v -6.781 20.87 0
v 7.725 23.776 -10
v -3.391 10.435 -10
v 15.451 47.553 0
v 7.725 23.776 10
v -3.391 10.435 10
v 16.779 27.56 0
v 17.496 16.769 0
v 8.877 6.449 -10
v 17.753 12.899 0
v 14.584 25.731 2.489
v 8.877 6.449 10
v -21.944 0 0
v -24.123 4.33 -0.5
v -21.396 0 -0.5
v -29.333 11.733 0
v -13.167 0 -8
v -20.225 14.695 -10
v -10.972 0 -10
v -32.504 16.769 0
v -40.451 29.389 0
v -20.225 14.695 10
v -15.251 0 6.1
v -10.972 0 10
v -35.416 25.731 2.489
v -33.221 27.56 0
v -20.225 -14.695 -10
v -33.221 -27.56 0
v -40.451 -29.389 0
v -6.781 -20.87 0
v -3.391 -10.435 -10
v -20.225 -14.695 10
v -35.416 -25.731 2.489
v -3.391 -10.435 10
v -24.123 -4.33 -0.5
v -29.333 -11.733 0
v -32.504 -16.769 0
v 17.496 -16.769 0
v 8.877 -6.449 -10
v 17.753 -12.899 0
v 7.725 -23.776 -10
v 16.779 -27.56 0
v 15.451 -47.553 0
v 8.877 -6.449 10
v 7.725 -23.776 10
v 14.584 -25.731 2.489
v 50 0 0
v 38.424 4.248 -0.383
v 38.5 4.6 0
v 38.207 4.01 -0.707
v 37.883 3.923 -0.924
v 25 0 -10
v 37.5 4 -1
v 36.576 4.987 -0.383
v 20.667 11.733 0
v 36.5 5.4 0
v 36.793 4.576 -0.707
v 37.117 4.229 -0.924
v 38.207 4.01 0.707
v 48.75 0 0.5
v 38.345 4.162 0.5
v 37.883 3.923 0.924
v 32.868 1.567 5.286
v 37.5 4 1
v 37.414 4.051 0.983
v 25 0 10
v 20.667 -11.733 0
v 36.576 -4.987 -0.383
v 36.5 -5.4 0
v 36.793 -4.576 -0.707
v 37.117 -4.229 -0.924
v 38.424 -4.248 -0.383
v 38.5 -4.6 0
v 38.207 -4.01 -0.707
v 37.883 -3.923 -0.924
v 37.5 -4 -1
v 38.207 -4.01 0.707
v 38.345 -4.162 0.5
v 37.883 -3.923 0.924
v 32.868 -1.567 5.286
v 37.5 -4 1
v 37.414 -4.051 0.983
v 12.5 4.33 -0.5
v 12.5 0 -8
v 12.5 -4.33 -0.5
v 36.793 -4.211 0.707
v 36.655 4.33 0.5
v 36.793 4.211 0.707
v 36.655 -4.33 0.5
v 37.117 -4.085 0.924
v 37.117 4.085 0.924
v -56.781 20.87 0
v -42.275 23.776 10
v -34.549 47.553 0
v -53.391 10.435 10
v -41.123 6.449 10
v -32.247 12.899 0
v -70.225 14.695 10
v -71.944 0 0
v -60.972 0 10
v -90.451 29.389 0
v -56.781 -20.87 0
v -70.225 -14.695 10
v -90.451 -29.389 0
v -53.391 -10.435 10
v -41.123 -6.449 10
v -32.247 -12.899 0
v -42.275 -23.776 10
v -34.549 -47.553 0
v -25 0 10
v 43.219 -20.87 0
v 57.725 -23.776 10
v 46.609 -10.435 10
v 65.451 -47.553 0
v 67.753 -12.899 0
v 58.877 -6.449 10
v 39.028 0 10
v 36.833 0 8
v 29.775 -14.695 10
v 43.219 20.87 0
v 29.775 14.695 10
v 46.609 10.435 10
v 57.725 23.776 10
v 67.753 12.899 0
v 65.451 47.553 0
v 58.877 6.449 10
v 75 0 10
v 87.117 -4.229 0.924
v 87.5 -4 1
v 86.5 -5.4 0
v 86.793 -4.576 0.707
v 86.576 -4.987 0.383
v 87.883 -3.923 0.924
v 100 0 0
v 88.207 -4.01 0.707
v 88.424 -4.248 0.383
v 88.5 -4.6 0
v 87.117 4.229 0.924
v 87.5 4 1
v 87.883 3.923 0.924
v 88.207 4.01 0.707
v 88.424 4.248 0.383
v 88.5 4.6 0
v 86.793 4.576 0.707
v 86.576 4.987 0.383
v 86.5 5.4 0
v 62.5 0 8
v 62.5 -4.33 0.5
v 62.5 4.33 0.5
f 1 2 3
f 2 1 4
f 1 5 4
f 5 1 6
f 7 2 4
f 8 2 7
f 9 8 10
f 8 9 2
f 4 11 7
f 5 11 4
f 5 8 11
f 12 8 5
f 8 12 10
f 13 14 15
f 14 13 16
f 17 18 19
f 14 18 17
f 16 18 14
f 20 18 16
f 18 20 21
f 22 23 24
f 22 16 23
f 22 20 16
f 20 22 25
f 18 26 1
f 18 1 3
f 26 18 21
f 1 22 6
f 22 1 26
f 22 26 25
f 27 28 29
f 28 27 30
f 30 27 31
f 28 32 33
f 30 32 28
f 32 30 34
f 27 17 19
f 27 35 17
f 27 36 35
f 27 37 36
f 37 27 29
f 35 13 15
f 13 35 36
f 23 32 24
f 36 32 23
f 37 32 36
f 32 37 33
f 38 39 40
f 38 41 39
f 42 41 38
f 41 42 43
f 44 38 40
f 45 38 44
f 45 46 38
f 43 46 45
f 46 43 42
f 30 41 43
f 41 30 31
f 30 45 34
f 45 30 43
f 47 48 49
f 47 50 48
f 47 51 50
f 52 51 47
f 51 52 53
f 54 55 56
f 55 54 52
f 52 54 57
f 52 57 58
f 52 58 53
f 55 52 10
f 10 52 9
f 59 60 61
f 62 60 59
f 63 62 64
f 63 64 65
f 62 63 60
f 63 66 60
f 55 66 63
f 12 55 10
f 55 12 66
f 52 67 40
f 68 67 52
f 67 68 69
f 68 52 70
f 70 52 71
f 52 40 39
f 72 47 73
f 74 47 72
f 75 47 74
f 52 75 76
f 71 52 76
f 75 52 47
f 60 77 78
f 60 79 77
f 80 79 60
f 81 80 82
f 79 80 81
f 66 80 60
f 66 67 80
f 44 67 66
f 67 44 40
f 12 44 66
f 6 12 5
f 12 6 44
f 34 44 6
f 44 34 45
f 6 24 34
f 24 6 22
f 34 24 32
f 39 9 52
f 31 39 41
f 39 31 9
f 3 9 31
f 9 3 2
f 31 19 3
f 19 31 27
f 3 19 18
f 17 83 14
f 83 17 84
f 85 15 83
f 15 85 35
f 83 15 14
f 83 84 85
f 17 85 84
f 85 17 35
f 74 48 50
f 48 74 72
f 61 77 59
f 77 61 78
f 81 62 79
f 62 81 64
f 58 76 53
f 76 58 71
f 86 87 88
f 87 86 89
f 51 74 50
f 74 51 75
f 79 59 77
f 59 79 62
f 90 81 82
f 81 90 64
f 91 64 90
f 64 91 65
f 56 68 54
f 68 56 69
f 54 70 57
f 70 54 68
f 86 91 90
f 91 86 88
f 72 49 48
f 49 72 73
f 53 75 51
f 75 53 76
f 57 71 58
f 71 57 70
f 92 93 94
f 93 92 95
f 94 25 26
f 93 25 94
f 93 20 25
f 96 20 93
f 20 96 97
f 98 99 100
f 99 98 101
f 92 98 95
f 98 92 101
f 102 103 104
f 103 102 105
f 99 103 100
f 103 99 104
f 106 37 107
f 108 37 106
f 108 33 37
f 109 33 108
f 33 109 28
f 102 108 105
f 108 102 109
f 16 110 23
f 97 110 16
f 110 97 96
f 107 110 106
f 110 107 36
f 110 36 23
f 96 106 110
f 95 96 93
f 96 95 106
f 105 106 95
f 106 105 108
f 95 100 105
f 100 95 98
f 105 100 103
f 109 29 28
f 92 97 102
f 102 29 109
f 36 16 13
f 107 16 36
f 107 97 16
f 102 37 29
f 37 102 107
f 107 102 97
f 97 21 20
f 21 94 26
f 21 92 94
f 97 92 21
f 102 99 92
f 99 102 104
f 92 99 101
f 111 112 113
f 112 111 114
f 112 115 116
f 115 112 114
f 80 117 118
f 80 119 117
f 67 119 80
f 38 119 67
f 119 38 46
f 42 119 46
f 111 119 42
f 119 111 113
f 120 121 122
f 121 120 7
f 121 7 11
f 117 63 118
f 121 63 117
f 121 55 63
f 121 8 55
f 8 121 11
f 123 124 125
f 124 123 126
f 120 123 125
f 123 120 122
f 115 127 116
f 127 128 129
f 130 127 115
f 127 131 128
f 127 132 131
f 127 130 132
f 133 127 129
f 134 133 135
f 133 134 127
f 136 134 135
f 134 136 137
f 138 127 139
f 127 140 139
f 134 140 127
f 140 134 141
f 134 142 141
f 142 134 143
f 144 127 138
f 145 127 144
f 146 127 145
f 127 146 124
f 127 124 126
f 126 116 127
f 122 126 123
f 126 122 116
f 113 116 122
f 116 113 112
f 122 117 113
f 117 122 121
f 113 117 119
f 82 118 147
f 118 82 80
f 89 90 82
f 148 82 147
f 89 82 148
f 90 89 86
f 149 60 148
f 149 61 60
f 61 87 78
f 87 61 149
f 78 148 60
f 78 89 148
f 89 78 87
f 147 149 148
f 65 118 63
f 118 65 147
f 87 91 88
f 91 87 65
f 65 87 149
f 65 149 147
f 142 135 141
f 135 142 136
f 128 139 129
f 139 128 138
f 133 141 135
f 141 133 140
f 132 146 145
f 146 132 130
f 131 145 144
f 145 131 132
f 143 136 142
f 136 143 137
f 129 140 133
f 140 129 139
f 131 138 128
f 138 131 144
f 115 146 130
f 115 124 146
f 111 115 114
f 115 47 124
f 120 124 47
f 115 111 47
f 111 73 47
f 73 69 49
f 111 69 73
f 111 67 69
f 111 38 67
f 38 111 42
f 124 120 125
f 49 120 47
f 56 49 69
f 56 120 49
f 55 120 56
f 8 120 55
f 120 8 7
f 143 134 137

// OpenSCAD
// [FL_INDEX: keywords="openscad, 3d_parametric, StarMaker, csg_solid" | COT="Parametric OpenSCAD design from 3DCodeverse"]
// Title: StarMaker

// ===== file: StarMaker.scad =====
//StarMaker
//by Alex Tanchoco (LionAlex)
//December 9, 2013
//Originally designed for making Christmas tree ornaments but can be adopted for making all kinds of stars


star_points = 5;
star_thickness = 0;
point_length = 50;
point_width = 20;
point_thickness = 5;
point_points = 4;
post_diameter = 10;
post_sides = 3;
each_angle = 180/point_points;
mounting_post = true;
thread_hole = true;


difference() {
	intersection() {
		star();
		if( star_thickness>0 )
		cube( [point_length*3,point_length*3,star_thickness], center=true );
	}
	//mounting post
	if( mounting_post )
		translate( [-point_length*0.25,0,-post_diameter/2+2] )
			rotate( [0,90,0] )
				cylinder( h=point_length,r=post_diameter/2,$fn=post_sides, center = true );

	//thread hole
	if( thread_hole )
		translate( [point_length*0.75,0,0] )
			rotate( [90,0,0] )
				cylinder( h=point_length,r=1,$fn=16, center = true );	
}

module star(star_scale=1) {
	scale( [star_scale,star_scale,star_scale] )
	for( i=[1:1:star_points] ) {
		rotate( [0,0,360/star_points * i] )
			translate( [point_length/2,0,0] )
				rotate( [0,90,0] )
				cylinder( h=point_length, r1=point_width, r2=0, $fn = point_points, center=true );
	}
}

// ===== file: StarMakerHalves.scad =====
//StarMaker Halves
//by Alex Tanchoco (LionAlex)
//December 10, 2013
//Originally designed for making Christmas tree ornaments but can be adopted for making all kinds of stars


star_points = 5;
star_thickness = 0;
point_length = 50;
point_width = 20;
point_thickness = 5;
point_points = 4;
post_diameter = 10;
post_sides = 3;
each_angle = 180/point_points;
mounting_post = true;
thread_hole = true;

translate( [-point_length,0,0] )
	top_half();
translate( [point_length,0,0] )
	bottom_half();


module top_half() {
	//top half
	difference() {
		fullstar();
		translate( [-point_length,-point_length,-point_length*2] )
			cube( [point_length*2,point_length*2,point_length*2,] );
	}

}


module bottom_half() {
	//bottom half
	difference() {
		rotate( [180,0,0] )
			fullstar();	
		translate( [-point_length,-point_length,-point_length*2] )
			cube( [point_length*2,point_length*2,point_length*2,] );
	}
}


module fullstar() {
difference() {
	intersection() {
		star();
		if( star_thickness>0 )
		cube( [point_length*3,point_length*3,star_thickness], center=true );
	}
	//mounting post
	if( mounting_post )
		translate( [-point_length*0.25,0,-post_diameter/2+2] )
			rotate( [0,90,0] )
				cylinder( h=point_length,r=post_diameter/2,$fn=post_sides, center = true );

	//thread hole
	if( thread_hole )
		translate( [point_length*0.75,0,0] )
			rotate( [90,0,0] )
				cylinder( h=point_length,r=1,$fn=16, center = true );	
}
}

module star(star_scale=1) {
	scale( [star_scale,star_scale,star_scale] )
	for( i=[1:1:star_points] ) {
		rotate( [0,0,360/star_points * i] )
			translate( [point_length/2,0,0] )
				rotate( [0,90,0] )
				cylinder( h=point_length, r1=point_width, r2=0, $fn = point_points, center=true );
	}
}

// ===== file: StarMaker_flatface.scad =====
//StarMaker
//by Alex Tanchoco (LionAlex)
//December 9, 2013
//Originally designed for making Christmas tree ornaments but can be adopted for making all kinds of stars


star_points = 5;
star_thickness = 20;
point_length = 50;
point_width = 20;
point_thickness = 5;
point_points = 4;
post_diameter = 10;
post_sides = 3;
each_angle = 180/point_points;
mounting_post = true;
thread_hole = true;


difference() {
	intersection() {
		star();
		if( star_thickness>0 )
		cube( [point_length*3,point_length*3,star_thickness], center=true );
	}
	//mounting post
	if( mounting_post )
		translate( [-point_length*0.25,0,-post_diameter/2+2] )
			rotate( [0,90,0] )
				cylinder( h=point_length,r=post_diameter/2,$fn=post_sides, center = true );

	//thread hole
	if( thread_hole )
		translate( [point_length*0.75,0,0] )
			rotate( [90,0,0] )
				cylinder( h=point_length,r=1,$fn=16, center = true );	
}

module star(star_scale=1) {
	scale( [star_scale,star_scale,star_scale] )
	for( i=[1:1:star_points] ) {
		rotate( [0,0,360/star_points * i] )
			translate( [point_length/2,0,0] )
				rotate( [0,90,0] )
				cylinder( h=point_length, r1=point_width, r2=0, $fn = point_points, center=true );
	}
}
